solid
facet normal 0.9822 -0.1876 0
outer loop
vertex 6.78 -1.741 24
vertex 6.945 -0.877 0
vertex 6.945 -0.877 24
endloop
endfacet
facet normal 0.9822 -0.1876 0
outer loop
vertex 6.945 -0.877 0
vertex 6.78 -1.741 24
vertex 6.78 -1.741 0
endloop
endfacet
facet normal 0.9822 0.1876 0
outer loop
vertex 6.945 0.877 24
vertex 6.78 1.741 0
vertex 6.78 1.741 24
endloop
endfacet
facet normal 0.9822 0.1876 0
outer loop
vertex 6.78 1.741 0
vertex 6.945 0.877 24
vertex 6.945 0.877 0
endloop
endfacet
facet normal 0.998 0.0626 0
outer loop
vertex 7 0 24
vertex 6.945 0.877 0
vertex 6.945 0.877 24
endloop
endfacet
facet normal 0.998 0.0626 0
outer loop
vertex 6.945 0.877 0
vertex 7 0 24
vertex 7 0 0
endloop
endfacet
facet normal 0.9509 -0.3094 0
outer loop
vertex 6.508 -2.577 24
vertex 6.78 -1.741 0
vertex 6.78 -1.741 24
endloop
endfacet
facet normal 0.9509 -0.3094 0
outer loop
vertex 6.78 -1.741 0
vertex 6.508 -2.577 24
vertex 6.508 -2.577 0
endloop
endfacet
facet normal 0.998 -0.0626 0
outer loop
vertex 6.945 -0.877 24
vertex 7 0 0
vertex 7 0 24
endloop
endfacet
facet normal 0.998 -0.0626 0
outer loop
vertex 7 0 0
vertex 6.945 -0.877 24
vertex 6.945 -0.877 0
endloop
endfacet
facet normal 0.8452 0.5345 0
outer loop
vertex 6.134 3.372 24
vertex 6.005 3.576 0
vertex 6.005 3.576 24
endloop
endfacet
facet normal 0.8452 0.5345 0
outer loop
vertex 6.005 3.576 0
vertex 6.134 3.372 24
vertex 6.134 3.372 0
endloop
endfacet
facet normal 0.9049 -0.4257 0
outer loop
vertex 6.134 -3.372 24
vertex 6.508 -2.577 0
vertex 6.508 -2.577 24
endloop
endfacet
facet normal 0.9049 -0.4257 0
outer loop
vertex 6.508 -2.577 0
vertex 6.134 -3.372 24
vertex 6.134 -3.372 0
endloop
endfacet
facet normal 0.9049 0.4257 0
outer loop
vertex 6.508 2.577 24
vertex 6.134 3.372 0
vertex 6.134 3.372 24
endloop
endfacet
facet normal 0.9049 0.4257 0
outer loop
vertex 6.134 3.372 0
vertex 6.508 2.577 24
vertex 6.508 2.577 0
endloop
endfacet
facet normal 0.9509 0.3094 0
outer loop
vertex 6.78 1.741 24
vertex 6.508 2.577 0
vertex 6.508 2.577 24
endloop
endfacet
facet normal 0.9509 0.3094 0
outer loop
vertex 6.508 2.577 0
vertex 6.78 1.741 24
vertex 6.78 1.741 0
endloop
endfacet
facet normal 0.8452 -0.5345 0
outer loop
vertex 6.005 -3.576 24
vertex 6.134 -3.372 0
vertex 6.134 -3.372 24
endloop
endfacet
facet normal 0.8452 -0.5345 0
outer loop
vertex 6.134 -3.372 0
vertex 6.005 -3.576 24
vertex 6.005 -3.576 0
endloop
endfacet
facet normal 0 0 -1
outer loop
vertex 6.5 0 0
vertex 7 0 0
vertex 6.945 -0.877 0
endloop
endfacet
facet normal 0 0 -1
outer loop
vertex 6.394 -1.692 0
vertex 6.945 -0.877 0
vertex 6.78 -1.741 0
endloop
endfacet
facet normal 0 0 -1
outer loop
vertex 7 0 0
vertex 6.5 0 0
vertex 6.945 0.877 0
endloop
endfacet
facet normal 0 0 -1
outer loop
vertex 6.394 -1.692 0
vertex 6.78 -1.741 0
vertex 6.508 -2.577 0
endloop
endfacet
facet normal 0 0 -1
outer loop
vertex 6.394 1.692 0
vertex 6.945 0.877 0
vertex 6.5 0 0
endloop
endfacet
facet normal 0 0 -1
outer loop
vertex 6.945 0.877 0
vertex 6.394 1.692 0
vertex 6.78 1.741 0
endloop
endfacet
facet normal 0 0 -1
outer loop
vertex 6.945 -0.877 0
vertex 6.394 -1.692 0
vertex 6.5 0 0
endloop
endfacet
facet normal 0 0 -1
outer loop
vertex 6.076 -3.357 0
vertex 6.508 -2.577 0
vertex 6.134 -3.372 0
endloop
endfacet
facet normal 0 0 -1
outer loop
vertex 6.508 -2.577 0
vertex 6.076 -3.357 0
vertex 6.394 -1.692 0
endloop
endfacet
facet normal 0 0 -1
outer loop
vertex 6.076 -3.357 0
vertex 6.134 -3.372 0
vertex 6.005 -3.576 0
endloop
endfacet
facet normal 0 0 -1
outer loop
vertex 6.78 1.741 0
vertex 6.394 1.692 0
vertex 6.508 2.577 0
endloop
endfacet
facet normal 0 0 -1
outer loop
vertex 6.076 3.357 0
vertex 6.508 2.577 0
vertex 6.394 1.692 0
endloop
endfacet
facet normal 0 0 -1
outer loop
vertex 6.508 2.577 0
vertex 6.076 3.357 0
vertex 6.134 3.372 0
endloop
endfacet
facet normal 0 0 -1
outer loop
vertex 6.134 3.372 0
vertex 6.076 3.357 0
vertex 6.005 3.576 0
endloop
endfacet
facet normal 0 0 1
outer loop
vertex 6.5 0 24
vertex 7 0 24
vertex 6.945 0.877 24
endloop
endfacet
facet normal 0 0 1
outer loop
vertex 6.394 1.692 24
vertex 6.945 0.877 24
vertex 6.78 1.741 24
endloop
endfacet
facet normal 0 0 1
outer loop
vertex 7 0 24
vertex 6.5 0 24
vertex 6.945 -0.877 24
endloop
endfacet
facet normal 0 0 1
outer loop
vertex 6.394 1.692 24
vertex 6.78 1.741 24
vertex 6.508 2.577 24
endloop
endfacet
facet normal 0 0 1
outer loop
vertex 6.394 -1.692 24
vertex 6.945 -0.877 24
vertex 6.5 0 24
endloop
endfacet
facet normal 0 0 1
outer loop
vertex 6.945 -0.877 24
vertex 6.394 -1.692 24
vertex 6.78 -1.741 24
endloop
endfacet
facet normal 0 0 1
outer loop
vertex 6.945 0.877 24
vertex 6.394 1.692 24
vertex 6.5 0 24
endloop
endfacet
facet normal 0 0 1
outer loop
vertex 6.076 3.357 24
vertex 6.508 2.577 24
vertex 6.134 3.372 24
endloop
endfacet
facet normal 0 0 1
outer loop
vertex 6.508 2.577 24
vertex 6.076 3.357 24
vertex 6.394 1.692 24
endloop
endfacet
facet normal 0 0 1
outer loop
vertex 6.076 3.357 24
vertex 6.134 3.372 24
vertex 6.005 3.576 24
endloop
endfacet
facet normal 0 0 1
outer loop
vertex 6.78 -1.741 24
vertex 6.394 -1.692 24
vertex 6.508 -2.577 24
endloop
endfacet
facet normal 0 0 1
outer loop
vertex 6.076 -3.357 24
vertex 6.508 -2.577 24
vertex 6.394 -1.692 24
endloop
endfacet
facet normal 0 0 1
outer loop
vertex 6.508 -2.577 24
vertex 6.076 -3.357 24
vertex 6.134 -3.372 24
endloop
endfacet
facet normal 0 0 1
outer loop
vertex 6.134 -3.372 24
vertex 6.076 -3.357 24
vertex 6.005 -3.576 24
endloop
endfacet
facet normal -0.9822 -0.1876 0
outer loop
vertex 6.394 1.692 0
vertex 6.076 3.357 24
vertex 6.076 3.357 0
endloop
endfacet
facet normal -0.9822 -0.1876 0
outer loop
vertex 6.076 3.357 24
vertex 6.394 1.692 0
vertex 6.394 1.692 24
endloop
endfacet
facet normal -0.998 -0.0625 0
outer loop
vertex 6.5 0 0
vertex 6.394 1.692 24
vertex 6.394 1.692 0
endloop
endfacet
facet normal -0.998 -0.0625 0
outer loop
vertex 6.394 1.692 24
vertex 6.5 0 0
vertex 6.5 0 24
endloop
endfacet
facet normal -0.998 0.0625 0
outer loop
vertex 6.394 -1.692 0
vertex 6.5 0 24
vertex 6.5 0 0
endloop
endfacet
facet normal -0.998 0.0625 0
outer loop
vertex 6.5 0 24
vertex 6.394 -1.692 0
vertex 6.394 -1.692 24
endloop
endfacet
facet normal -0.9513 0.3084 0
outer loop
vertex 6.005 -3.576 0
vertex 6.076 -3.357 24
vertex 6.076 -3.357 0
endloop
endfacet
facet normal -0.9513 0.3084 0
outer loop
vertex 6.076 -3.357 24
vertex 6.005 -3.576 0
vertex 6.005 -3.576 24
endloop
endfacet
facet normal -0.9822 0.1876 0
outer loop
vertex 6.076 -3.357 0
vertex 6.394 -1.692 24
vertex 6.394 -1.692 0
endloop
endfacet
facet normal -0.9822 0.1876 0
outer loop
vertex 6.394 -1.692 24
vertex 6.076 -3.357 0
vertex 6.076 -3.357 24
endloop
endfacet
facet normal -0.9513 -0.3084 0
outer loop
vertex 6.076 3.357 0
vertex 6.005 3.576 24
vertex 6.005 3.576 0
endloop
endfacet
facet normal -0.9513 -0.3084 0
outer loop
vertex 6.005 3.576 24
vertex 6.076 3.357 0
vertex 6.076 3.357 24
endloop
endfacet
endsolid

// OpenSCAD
$fn = 50;


difference() {
	union() {
		cylinder(h = 24, r = 7.0000000000);
		translate(v = [-10.0000000000, 0, 0]) {
			cylinder(h = 24, r = 7.0000000000);
		}
	}
	union() {
		cylinder(h = 24, r = 3.2500000000);
		cylinder(h = 24, r = 1.8000000000);
		cylinder(h = 24, r = 1.8000000000);
		cylinder(h = 24, r = 1.8000000000);
		translate(v = [-14.5000000000, 0, 0]) {
			hull() {
				translate(v = [-3.7500000000, 0.0000000000, 0]) {
					cylinder(h = 24, r = 10.5000000000);
				}
				translate(v = [3.7500000000, 0.0000000000, 0]) {
					cylinder(h = 24, r = 10.5000000000);
				}
				translate(v = [-3.7500000000, -0.0000000000, 0]) {
					cylinder(h = 24, r = 10.5000000000);
				}
				translate(v = [3.7500000000, -0.0000000000, 0]) {
					cylinder(h = 24, r = 10.5000000000);
				}
			}
		}
		translate(v = [-7.0000000000, 0, 0.0000000000]) {
			cylinder(h = 24, r = 13.5000000000);
		}
	}
}
